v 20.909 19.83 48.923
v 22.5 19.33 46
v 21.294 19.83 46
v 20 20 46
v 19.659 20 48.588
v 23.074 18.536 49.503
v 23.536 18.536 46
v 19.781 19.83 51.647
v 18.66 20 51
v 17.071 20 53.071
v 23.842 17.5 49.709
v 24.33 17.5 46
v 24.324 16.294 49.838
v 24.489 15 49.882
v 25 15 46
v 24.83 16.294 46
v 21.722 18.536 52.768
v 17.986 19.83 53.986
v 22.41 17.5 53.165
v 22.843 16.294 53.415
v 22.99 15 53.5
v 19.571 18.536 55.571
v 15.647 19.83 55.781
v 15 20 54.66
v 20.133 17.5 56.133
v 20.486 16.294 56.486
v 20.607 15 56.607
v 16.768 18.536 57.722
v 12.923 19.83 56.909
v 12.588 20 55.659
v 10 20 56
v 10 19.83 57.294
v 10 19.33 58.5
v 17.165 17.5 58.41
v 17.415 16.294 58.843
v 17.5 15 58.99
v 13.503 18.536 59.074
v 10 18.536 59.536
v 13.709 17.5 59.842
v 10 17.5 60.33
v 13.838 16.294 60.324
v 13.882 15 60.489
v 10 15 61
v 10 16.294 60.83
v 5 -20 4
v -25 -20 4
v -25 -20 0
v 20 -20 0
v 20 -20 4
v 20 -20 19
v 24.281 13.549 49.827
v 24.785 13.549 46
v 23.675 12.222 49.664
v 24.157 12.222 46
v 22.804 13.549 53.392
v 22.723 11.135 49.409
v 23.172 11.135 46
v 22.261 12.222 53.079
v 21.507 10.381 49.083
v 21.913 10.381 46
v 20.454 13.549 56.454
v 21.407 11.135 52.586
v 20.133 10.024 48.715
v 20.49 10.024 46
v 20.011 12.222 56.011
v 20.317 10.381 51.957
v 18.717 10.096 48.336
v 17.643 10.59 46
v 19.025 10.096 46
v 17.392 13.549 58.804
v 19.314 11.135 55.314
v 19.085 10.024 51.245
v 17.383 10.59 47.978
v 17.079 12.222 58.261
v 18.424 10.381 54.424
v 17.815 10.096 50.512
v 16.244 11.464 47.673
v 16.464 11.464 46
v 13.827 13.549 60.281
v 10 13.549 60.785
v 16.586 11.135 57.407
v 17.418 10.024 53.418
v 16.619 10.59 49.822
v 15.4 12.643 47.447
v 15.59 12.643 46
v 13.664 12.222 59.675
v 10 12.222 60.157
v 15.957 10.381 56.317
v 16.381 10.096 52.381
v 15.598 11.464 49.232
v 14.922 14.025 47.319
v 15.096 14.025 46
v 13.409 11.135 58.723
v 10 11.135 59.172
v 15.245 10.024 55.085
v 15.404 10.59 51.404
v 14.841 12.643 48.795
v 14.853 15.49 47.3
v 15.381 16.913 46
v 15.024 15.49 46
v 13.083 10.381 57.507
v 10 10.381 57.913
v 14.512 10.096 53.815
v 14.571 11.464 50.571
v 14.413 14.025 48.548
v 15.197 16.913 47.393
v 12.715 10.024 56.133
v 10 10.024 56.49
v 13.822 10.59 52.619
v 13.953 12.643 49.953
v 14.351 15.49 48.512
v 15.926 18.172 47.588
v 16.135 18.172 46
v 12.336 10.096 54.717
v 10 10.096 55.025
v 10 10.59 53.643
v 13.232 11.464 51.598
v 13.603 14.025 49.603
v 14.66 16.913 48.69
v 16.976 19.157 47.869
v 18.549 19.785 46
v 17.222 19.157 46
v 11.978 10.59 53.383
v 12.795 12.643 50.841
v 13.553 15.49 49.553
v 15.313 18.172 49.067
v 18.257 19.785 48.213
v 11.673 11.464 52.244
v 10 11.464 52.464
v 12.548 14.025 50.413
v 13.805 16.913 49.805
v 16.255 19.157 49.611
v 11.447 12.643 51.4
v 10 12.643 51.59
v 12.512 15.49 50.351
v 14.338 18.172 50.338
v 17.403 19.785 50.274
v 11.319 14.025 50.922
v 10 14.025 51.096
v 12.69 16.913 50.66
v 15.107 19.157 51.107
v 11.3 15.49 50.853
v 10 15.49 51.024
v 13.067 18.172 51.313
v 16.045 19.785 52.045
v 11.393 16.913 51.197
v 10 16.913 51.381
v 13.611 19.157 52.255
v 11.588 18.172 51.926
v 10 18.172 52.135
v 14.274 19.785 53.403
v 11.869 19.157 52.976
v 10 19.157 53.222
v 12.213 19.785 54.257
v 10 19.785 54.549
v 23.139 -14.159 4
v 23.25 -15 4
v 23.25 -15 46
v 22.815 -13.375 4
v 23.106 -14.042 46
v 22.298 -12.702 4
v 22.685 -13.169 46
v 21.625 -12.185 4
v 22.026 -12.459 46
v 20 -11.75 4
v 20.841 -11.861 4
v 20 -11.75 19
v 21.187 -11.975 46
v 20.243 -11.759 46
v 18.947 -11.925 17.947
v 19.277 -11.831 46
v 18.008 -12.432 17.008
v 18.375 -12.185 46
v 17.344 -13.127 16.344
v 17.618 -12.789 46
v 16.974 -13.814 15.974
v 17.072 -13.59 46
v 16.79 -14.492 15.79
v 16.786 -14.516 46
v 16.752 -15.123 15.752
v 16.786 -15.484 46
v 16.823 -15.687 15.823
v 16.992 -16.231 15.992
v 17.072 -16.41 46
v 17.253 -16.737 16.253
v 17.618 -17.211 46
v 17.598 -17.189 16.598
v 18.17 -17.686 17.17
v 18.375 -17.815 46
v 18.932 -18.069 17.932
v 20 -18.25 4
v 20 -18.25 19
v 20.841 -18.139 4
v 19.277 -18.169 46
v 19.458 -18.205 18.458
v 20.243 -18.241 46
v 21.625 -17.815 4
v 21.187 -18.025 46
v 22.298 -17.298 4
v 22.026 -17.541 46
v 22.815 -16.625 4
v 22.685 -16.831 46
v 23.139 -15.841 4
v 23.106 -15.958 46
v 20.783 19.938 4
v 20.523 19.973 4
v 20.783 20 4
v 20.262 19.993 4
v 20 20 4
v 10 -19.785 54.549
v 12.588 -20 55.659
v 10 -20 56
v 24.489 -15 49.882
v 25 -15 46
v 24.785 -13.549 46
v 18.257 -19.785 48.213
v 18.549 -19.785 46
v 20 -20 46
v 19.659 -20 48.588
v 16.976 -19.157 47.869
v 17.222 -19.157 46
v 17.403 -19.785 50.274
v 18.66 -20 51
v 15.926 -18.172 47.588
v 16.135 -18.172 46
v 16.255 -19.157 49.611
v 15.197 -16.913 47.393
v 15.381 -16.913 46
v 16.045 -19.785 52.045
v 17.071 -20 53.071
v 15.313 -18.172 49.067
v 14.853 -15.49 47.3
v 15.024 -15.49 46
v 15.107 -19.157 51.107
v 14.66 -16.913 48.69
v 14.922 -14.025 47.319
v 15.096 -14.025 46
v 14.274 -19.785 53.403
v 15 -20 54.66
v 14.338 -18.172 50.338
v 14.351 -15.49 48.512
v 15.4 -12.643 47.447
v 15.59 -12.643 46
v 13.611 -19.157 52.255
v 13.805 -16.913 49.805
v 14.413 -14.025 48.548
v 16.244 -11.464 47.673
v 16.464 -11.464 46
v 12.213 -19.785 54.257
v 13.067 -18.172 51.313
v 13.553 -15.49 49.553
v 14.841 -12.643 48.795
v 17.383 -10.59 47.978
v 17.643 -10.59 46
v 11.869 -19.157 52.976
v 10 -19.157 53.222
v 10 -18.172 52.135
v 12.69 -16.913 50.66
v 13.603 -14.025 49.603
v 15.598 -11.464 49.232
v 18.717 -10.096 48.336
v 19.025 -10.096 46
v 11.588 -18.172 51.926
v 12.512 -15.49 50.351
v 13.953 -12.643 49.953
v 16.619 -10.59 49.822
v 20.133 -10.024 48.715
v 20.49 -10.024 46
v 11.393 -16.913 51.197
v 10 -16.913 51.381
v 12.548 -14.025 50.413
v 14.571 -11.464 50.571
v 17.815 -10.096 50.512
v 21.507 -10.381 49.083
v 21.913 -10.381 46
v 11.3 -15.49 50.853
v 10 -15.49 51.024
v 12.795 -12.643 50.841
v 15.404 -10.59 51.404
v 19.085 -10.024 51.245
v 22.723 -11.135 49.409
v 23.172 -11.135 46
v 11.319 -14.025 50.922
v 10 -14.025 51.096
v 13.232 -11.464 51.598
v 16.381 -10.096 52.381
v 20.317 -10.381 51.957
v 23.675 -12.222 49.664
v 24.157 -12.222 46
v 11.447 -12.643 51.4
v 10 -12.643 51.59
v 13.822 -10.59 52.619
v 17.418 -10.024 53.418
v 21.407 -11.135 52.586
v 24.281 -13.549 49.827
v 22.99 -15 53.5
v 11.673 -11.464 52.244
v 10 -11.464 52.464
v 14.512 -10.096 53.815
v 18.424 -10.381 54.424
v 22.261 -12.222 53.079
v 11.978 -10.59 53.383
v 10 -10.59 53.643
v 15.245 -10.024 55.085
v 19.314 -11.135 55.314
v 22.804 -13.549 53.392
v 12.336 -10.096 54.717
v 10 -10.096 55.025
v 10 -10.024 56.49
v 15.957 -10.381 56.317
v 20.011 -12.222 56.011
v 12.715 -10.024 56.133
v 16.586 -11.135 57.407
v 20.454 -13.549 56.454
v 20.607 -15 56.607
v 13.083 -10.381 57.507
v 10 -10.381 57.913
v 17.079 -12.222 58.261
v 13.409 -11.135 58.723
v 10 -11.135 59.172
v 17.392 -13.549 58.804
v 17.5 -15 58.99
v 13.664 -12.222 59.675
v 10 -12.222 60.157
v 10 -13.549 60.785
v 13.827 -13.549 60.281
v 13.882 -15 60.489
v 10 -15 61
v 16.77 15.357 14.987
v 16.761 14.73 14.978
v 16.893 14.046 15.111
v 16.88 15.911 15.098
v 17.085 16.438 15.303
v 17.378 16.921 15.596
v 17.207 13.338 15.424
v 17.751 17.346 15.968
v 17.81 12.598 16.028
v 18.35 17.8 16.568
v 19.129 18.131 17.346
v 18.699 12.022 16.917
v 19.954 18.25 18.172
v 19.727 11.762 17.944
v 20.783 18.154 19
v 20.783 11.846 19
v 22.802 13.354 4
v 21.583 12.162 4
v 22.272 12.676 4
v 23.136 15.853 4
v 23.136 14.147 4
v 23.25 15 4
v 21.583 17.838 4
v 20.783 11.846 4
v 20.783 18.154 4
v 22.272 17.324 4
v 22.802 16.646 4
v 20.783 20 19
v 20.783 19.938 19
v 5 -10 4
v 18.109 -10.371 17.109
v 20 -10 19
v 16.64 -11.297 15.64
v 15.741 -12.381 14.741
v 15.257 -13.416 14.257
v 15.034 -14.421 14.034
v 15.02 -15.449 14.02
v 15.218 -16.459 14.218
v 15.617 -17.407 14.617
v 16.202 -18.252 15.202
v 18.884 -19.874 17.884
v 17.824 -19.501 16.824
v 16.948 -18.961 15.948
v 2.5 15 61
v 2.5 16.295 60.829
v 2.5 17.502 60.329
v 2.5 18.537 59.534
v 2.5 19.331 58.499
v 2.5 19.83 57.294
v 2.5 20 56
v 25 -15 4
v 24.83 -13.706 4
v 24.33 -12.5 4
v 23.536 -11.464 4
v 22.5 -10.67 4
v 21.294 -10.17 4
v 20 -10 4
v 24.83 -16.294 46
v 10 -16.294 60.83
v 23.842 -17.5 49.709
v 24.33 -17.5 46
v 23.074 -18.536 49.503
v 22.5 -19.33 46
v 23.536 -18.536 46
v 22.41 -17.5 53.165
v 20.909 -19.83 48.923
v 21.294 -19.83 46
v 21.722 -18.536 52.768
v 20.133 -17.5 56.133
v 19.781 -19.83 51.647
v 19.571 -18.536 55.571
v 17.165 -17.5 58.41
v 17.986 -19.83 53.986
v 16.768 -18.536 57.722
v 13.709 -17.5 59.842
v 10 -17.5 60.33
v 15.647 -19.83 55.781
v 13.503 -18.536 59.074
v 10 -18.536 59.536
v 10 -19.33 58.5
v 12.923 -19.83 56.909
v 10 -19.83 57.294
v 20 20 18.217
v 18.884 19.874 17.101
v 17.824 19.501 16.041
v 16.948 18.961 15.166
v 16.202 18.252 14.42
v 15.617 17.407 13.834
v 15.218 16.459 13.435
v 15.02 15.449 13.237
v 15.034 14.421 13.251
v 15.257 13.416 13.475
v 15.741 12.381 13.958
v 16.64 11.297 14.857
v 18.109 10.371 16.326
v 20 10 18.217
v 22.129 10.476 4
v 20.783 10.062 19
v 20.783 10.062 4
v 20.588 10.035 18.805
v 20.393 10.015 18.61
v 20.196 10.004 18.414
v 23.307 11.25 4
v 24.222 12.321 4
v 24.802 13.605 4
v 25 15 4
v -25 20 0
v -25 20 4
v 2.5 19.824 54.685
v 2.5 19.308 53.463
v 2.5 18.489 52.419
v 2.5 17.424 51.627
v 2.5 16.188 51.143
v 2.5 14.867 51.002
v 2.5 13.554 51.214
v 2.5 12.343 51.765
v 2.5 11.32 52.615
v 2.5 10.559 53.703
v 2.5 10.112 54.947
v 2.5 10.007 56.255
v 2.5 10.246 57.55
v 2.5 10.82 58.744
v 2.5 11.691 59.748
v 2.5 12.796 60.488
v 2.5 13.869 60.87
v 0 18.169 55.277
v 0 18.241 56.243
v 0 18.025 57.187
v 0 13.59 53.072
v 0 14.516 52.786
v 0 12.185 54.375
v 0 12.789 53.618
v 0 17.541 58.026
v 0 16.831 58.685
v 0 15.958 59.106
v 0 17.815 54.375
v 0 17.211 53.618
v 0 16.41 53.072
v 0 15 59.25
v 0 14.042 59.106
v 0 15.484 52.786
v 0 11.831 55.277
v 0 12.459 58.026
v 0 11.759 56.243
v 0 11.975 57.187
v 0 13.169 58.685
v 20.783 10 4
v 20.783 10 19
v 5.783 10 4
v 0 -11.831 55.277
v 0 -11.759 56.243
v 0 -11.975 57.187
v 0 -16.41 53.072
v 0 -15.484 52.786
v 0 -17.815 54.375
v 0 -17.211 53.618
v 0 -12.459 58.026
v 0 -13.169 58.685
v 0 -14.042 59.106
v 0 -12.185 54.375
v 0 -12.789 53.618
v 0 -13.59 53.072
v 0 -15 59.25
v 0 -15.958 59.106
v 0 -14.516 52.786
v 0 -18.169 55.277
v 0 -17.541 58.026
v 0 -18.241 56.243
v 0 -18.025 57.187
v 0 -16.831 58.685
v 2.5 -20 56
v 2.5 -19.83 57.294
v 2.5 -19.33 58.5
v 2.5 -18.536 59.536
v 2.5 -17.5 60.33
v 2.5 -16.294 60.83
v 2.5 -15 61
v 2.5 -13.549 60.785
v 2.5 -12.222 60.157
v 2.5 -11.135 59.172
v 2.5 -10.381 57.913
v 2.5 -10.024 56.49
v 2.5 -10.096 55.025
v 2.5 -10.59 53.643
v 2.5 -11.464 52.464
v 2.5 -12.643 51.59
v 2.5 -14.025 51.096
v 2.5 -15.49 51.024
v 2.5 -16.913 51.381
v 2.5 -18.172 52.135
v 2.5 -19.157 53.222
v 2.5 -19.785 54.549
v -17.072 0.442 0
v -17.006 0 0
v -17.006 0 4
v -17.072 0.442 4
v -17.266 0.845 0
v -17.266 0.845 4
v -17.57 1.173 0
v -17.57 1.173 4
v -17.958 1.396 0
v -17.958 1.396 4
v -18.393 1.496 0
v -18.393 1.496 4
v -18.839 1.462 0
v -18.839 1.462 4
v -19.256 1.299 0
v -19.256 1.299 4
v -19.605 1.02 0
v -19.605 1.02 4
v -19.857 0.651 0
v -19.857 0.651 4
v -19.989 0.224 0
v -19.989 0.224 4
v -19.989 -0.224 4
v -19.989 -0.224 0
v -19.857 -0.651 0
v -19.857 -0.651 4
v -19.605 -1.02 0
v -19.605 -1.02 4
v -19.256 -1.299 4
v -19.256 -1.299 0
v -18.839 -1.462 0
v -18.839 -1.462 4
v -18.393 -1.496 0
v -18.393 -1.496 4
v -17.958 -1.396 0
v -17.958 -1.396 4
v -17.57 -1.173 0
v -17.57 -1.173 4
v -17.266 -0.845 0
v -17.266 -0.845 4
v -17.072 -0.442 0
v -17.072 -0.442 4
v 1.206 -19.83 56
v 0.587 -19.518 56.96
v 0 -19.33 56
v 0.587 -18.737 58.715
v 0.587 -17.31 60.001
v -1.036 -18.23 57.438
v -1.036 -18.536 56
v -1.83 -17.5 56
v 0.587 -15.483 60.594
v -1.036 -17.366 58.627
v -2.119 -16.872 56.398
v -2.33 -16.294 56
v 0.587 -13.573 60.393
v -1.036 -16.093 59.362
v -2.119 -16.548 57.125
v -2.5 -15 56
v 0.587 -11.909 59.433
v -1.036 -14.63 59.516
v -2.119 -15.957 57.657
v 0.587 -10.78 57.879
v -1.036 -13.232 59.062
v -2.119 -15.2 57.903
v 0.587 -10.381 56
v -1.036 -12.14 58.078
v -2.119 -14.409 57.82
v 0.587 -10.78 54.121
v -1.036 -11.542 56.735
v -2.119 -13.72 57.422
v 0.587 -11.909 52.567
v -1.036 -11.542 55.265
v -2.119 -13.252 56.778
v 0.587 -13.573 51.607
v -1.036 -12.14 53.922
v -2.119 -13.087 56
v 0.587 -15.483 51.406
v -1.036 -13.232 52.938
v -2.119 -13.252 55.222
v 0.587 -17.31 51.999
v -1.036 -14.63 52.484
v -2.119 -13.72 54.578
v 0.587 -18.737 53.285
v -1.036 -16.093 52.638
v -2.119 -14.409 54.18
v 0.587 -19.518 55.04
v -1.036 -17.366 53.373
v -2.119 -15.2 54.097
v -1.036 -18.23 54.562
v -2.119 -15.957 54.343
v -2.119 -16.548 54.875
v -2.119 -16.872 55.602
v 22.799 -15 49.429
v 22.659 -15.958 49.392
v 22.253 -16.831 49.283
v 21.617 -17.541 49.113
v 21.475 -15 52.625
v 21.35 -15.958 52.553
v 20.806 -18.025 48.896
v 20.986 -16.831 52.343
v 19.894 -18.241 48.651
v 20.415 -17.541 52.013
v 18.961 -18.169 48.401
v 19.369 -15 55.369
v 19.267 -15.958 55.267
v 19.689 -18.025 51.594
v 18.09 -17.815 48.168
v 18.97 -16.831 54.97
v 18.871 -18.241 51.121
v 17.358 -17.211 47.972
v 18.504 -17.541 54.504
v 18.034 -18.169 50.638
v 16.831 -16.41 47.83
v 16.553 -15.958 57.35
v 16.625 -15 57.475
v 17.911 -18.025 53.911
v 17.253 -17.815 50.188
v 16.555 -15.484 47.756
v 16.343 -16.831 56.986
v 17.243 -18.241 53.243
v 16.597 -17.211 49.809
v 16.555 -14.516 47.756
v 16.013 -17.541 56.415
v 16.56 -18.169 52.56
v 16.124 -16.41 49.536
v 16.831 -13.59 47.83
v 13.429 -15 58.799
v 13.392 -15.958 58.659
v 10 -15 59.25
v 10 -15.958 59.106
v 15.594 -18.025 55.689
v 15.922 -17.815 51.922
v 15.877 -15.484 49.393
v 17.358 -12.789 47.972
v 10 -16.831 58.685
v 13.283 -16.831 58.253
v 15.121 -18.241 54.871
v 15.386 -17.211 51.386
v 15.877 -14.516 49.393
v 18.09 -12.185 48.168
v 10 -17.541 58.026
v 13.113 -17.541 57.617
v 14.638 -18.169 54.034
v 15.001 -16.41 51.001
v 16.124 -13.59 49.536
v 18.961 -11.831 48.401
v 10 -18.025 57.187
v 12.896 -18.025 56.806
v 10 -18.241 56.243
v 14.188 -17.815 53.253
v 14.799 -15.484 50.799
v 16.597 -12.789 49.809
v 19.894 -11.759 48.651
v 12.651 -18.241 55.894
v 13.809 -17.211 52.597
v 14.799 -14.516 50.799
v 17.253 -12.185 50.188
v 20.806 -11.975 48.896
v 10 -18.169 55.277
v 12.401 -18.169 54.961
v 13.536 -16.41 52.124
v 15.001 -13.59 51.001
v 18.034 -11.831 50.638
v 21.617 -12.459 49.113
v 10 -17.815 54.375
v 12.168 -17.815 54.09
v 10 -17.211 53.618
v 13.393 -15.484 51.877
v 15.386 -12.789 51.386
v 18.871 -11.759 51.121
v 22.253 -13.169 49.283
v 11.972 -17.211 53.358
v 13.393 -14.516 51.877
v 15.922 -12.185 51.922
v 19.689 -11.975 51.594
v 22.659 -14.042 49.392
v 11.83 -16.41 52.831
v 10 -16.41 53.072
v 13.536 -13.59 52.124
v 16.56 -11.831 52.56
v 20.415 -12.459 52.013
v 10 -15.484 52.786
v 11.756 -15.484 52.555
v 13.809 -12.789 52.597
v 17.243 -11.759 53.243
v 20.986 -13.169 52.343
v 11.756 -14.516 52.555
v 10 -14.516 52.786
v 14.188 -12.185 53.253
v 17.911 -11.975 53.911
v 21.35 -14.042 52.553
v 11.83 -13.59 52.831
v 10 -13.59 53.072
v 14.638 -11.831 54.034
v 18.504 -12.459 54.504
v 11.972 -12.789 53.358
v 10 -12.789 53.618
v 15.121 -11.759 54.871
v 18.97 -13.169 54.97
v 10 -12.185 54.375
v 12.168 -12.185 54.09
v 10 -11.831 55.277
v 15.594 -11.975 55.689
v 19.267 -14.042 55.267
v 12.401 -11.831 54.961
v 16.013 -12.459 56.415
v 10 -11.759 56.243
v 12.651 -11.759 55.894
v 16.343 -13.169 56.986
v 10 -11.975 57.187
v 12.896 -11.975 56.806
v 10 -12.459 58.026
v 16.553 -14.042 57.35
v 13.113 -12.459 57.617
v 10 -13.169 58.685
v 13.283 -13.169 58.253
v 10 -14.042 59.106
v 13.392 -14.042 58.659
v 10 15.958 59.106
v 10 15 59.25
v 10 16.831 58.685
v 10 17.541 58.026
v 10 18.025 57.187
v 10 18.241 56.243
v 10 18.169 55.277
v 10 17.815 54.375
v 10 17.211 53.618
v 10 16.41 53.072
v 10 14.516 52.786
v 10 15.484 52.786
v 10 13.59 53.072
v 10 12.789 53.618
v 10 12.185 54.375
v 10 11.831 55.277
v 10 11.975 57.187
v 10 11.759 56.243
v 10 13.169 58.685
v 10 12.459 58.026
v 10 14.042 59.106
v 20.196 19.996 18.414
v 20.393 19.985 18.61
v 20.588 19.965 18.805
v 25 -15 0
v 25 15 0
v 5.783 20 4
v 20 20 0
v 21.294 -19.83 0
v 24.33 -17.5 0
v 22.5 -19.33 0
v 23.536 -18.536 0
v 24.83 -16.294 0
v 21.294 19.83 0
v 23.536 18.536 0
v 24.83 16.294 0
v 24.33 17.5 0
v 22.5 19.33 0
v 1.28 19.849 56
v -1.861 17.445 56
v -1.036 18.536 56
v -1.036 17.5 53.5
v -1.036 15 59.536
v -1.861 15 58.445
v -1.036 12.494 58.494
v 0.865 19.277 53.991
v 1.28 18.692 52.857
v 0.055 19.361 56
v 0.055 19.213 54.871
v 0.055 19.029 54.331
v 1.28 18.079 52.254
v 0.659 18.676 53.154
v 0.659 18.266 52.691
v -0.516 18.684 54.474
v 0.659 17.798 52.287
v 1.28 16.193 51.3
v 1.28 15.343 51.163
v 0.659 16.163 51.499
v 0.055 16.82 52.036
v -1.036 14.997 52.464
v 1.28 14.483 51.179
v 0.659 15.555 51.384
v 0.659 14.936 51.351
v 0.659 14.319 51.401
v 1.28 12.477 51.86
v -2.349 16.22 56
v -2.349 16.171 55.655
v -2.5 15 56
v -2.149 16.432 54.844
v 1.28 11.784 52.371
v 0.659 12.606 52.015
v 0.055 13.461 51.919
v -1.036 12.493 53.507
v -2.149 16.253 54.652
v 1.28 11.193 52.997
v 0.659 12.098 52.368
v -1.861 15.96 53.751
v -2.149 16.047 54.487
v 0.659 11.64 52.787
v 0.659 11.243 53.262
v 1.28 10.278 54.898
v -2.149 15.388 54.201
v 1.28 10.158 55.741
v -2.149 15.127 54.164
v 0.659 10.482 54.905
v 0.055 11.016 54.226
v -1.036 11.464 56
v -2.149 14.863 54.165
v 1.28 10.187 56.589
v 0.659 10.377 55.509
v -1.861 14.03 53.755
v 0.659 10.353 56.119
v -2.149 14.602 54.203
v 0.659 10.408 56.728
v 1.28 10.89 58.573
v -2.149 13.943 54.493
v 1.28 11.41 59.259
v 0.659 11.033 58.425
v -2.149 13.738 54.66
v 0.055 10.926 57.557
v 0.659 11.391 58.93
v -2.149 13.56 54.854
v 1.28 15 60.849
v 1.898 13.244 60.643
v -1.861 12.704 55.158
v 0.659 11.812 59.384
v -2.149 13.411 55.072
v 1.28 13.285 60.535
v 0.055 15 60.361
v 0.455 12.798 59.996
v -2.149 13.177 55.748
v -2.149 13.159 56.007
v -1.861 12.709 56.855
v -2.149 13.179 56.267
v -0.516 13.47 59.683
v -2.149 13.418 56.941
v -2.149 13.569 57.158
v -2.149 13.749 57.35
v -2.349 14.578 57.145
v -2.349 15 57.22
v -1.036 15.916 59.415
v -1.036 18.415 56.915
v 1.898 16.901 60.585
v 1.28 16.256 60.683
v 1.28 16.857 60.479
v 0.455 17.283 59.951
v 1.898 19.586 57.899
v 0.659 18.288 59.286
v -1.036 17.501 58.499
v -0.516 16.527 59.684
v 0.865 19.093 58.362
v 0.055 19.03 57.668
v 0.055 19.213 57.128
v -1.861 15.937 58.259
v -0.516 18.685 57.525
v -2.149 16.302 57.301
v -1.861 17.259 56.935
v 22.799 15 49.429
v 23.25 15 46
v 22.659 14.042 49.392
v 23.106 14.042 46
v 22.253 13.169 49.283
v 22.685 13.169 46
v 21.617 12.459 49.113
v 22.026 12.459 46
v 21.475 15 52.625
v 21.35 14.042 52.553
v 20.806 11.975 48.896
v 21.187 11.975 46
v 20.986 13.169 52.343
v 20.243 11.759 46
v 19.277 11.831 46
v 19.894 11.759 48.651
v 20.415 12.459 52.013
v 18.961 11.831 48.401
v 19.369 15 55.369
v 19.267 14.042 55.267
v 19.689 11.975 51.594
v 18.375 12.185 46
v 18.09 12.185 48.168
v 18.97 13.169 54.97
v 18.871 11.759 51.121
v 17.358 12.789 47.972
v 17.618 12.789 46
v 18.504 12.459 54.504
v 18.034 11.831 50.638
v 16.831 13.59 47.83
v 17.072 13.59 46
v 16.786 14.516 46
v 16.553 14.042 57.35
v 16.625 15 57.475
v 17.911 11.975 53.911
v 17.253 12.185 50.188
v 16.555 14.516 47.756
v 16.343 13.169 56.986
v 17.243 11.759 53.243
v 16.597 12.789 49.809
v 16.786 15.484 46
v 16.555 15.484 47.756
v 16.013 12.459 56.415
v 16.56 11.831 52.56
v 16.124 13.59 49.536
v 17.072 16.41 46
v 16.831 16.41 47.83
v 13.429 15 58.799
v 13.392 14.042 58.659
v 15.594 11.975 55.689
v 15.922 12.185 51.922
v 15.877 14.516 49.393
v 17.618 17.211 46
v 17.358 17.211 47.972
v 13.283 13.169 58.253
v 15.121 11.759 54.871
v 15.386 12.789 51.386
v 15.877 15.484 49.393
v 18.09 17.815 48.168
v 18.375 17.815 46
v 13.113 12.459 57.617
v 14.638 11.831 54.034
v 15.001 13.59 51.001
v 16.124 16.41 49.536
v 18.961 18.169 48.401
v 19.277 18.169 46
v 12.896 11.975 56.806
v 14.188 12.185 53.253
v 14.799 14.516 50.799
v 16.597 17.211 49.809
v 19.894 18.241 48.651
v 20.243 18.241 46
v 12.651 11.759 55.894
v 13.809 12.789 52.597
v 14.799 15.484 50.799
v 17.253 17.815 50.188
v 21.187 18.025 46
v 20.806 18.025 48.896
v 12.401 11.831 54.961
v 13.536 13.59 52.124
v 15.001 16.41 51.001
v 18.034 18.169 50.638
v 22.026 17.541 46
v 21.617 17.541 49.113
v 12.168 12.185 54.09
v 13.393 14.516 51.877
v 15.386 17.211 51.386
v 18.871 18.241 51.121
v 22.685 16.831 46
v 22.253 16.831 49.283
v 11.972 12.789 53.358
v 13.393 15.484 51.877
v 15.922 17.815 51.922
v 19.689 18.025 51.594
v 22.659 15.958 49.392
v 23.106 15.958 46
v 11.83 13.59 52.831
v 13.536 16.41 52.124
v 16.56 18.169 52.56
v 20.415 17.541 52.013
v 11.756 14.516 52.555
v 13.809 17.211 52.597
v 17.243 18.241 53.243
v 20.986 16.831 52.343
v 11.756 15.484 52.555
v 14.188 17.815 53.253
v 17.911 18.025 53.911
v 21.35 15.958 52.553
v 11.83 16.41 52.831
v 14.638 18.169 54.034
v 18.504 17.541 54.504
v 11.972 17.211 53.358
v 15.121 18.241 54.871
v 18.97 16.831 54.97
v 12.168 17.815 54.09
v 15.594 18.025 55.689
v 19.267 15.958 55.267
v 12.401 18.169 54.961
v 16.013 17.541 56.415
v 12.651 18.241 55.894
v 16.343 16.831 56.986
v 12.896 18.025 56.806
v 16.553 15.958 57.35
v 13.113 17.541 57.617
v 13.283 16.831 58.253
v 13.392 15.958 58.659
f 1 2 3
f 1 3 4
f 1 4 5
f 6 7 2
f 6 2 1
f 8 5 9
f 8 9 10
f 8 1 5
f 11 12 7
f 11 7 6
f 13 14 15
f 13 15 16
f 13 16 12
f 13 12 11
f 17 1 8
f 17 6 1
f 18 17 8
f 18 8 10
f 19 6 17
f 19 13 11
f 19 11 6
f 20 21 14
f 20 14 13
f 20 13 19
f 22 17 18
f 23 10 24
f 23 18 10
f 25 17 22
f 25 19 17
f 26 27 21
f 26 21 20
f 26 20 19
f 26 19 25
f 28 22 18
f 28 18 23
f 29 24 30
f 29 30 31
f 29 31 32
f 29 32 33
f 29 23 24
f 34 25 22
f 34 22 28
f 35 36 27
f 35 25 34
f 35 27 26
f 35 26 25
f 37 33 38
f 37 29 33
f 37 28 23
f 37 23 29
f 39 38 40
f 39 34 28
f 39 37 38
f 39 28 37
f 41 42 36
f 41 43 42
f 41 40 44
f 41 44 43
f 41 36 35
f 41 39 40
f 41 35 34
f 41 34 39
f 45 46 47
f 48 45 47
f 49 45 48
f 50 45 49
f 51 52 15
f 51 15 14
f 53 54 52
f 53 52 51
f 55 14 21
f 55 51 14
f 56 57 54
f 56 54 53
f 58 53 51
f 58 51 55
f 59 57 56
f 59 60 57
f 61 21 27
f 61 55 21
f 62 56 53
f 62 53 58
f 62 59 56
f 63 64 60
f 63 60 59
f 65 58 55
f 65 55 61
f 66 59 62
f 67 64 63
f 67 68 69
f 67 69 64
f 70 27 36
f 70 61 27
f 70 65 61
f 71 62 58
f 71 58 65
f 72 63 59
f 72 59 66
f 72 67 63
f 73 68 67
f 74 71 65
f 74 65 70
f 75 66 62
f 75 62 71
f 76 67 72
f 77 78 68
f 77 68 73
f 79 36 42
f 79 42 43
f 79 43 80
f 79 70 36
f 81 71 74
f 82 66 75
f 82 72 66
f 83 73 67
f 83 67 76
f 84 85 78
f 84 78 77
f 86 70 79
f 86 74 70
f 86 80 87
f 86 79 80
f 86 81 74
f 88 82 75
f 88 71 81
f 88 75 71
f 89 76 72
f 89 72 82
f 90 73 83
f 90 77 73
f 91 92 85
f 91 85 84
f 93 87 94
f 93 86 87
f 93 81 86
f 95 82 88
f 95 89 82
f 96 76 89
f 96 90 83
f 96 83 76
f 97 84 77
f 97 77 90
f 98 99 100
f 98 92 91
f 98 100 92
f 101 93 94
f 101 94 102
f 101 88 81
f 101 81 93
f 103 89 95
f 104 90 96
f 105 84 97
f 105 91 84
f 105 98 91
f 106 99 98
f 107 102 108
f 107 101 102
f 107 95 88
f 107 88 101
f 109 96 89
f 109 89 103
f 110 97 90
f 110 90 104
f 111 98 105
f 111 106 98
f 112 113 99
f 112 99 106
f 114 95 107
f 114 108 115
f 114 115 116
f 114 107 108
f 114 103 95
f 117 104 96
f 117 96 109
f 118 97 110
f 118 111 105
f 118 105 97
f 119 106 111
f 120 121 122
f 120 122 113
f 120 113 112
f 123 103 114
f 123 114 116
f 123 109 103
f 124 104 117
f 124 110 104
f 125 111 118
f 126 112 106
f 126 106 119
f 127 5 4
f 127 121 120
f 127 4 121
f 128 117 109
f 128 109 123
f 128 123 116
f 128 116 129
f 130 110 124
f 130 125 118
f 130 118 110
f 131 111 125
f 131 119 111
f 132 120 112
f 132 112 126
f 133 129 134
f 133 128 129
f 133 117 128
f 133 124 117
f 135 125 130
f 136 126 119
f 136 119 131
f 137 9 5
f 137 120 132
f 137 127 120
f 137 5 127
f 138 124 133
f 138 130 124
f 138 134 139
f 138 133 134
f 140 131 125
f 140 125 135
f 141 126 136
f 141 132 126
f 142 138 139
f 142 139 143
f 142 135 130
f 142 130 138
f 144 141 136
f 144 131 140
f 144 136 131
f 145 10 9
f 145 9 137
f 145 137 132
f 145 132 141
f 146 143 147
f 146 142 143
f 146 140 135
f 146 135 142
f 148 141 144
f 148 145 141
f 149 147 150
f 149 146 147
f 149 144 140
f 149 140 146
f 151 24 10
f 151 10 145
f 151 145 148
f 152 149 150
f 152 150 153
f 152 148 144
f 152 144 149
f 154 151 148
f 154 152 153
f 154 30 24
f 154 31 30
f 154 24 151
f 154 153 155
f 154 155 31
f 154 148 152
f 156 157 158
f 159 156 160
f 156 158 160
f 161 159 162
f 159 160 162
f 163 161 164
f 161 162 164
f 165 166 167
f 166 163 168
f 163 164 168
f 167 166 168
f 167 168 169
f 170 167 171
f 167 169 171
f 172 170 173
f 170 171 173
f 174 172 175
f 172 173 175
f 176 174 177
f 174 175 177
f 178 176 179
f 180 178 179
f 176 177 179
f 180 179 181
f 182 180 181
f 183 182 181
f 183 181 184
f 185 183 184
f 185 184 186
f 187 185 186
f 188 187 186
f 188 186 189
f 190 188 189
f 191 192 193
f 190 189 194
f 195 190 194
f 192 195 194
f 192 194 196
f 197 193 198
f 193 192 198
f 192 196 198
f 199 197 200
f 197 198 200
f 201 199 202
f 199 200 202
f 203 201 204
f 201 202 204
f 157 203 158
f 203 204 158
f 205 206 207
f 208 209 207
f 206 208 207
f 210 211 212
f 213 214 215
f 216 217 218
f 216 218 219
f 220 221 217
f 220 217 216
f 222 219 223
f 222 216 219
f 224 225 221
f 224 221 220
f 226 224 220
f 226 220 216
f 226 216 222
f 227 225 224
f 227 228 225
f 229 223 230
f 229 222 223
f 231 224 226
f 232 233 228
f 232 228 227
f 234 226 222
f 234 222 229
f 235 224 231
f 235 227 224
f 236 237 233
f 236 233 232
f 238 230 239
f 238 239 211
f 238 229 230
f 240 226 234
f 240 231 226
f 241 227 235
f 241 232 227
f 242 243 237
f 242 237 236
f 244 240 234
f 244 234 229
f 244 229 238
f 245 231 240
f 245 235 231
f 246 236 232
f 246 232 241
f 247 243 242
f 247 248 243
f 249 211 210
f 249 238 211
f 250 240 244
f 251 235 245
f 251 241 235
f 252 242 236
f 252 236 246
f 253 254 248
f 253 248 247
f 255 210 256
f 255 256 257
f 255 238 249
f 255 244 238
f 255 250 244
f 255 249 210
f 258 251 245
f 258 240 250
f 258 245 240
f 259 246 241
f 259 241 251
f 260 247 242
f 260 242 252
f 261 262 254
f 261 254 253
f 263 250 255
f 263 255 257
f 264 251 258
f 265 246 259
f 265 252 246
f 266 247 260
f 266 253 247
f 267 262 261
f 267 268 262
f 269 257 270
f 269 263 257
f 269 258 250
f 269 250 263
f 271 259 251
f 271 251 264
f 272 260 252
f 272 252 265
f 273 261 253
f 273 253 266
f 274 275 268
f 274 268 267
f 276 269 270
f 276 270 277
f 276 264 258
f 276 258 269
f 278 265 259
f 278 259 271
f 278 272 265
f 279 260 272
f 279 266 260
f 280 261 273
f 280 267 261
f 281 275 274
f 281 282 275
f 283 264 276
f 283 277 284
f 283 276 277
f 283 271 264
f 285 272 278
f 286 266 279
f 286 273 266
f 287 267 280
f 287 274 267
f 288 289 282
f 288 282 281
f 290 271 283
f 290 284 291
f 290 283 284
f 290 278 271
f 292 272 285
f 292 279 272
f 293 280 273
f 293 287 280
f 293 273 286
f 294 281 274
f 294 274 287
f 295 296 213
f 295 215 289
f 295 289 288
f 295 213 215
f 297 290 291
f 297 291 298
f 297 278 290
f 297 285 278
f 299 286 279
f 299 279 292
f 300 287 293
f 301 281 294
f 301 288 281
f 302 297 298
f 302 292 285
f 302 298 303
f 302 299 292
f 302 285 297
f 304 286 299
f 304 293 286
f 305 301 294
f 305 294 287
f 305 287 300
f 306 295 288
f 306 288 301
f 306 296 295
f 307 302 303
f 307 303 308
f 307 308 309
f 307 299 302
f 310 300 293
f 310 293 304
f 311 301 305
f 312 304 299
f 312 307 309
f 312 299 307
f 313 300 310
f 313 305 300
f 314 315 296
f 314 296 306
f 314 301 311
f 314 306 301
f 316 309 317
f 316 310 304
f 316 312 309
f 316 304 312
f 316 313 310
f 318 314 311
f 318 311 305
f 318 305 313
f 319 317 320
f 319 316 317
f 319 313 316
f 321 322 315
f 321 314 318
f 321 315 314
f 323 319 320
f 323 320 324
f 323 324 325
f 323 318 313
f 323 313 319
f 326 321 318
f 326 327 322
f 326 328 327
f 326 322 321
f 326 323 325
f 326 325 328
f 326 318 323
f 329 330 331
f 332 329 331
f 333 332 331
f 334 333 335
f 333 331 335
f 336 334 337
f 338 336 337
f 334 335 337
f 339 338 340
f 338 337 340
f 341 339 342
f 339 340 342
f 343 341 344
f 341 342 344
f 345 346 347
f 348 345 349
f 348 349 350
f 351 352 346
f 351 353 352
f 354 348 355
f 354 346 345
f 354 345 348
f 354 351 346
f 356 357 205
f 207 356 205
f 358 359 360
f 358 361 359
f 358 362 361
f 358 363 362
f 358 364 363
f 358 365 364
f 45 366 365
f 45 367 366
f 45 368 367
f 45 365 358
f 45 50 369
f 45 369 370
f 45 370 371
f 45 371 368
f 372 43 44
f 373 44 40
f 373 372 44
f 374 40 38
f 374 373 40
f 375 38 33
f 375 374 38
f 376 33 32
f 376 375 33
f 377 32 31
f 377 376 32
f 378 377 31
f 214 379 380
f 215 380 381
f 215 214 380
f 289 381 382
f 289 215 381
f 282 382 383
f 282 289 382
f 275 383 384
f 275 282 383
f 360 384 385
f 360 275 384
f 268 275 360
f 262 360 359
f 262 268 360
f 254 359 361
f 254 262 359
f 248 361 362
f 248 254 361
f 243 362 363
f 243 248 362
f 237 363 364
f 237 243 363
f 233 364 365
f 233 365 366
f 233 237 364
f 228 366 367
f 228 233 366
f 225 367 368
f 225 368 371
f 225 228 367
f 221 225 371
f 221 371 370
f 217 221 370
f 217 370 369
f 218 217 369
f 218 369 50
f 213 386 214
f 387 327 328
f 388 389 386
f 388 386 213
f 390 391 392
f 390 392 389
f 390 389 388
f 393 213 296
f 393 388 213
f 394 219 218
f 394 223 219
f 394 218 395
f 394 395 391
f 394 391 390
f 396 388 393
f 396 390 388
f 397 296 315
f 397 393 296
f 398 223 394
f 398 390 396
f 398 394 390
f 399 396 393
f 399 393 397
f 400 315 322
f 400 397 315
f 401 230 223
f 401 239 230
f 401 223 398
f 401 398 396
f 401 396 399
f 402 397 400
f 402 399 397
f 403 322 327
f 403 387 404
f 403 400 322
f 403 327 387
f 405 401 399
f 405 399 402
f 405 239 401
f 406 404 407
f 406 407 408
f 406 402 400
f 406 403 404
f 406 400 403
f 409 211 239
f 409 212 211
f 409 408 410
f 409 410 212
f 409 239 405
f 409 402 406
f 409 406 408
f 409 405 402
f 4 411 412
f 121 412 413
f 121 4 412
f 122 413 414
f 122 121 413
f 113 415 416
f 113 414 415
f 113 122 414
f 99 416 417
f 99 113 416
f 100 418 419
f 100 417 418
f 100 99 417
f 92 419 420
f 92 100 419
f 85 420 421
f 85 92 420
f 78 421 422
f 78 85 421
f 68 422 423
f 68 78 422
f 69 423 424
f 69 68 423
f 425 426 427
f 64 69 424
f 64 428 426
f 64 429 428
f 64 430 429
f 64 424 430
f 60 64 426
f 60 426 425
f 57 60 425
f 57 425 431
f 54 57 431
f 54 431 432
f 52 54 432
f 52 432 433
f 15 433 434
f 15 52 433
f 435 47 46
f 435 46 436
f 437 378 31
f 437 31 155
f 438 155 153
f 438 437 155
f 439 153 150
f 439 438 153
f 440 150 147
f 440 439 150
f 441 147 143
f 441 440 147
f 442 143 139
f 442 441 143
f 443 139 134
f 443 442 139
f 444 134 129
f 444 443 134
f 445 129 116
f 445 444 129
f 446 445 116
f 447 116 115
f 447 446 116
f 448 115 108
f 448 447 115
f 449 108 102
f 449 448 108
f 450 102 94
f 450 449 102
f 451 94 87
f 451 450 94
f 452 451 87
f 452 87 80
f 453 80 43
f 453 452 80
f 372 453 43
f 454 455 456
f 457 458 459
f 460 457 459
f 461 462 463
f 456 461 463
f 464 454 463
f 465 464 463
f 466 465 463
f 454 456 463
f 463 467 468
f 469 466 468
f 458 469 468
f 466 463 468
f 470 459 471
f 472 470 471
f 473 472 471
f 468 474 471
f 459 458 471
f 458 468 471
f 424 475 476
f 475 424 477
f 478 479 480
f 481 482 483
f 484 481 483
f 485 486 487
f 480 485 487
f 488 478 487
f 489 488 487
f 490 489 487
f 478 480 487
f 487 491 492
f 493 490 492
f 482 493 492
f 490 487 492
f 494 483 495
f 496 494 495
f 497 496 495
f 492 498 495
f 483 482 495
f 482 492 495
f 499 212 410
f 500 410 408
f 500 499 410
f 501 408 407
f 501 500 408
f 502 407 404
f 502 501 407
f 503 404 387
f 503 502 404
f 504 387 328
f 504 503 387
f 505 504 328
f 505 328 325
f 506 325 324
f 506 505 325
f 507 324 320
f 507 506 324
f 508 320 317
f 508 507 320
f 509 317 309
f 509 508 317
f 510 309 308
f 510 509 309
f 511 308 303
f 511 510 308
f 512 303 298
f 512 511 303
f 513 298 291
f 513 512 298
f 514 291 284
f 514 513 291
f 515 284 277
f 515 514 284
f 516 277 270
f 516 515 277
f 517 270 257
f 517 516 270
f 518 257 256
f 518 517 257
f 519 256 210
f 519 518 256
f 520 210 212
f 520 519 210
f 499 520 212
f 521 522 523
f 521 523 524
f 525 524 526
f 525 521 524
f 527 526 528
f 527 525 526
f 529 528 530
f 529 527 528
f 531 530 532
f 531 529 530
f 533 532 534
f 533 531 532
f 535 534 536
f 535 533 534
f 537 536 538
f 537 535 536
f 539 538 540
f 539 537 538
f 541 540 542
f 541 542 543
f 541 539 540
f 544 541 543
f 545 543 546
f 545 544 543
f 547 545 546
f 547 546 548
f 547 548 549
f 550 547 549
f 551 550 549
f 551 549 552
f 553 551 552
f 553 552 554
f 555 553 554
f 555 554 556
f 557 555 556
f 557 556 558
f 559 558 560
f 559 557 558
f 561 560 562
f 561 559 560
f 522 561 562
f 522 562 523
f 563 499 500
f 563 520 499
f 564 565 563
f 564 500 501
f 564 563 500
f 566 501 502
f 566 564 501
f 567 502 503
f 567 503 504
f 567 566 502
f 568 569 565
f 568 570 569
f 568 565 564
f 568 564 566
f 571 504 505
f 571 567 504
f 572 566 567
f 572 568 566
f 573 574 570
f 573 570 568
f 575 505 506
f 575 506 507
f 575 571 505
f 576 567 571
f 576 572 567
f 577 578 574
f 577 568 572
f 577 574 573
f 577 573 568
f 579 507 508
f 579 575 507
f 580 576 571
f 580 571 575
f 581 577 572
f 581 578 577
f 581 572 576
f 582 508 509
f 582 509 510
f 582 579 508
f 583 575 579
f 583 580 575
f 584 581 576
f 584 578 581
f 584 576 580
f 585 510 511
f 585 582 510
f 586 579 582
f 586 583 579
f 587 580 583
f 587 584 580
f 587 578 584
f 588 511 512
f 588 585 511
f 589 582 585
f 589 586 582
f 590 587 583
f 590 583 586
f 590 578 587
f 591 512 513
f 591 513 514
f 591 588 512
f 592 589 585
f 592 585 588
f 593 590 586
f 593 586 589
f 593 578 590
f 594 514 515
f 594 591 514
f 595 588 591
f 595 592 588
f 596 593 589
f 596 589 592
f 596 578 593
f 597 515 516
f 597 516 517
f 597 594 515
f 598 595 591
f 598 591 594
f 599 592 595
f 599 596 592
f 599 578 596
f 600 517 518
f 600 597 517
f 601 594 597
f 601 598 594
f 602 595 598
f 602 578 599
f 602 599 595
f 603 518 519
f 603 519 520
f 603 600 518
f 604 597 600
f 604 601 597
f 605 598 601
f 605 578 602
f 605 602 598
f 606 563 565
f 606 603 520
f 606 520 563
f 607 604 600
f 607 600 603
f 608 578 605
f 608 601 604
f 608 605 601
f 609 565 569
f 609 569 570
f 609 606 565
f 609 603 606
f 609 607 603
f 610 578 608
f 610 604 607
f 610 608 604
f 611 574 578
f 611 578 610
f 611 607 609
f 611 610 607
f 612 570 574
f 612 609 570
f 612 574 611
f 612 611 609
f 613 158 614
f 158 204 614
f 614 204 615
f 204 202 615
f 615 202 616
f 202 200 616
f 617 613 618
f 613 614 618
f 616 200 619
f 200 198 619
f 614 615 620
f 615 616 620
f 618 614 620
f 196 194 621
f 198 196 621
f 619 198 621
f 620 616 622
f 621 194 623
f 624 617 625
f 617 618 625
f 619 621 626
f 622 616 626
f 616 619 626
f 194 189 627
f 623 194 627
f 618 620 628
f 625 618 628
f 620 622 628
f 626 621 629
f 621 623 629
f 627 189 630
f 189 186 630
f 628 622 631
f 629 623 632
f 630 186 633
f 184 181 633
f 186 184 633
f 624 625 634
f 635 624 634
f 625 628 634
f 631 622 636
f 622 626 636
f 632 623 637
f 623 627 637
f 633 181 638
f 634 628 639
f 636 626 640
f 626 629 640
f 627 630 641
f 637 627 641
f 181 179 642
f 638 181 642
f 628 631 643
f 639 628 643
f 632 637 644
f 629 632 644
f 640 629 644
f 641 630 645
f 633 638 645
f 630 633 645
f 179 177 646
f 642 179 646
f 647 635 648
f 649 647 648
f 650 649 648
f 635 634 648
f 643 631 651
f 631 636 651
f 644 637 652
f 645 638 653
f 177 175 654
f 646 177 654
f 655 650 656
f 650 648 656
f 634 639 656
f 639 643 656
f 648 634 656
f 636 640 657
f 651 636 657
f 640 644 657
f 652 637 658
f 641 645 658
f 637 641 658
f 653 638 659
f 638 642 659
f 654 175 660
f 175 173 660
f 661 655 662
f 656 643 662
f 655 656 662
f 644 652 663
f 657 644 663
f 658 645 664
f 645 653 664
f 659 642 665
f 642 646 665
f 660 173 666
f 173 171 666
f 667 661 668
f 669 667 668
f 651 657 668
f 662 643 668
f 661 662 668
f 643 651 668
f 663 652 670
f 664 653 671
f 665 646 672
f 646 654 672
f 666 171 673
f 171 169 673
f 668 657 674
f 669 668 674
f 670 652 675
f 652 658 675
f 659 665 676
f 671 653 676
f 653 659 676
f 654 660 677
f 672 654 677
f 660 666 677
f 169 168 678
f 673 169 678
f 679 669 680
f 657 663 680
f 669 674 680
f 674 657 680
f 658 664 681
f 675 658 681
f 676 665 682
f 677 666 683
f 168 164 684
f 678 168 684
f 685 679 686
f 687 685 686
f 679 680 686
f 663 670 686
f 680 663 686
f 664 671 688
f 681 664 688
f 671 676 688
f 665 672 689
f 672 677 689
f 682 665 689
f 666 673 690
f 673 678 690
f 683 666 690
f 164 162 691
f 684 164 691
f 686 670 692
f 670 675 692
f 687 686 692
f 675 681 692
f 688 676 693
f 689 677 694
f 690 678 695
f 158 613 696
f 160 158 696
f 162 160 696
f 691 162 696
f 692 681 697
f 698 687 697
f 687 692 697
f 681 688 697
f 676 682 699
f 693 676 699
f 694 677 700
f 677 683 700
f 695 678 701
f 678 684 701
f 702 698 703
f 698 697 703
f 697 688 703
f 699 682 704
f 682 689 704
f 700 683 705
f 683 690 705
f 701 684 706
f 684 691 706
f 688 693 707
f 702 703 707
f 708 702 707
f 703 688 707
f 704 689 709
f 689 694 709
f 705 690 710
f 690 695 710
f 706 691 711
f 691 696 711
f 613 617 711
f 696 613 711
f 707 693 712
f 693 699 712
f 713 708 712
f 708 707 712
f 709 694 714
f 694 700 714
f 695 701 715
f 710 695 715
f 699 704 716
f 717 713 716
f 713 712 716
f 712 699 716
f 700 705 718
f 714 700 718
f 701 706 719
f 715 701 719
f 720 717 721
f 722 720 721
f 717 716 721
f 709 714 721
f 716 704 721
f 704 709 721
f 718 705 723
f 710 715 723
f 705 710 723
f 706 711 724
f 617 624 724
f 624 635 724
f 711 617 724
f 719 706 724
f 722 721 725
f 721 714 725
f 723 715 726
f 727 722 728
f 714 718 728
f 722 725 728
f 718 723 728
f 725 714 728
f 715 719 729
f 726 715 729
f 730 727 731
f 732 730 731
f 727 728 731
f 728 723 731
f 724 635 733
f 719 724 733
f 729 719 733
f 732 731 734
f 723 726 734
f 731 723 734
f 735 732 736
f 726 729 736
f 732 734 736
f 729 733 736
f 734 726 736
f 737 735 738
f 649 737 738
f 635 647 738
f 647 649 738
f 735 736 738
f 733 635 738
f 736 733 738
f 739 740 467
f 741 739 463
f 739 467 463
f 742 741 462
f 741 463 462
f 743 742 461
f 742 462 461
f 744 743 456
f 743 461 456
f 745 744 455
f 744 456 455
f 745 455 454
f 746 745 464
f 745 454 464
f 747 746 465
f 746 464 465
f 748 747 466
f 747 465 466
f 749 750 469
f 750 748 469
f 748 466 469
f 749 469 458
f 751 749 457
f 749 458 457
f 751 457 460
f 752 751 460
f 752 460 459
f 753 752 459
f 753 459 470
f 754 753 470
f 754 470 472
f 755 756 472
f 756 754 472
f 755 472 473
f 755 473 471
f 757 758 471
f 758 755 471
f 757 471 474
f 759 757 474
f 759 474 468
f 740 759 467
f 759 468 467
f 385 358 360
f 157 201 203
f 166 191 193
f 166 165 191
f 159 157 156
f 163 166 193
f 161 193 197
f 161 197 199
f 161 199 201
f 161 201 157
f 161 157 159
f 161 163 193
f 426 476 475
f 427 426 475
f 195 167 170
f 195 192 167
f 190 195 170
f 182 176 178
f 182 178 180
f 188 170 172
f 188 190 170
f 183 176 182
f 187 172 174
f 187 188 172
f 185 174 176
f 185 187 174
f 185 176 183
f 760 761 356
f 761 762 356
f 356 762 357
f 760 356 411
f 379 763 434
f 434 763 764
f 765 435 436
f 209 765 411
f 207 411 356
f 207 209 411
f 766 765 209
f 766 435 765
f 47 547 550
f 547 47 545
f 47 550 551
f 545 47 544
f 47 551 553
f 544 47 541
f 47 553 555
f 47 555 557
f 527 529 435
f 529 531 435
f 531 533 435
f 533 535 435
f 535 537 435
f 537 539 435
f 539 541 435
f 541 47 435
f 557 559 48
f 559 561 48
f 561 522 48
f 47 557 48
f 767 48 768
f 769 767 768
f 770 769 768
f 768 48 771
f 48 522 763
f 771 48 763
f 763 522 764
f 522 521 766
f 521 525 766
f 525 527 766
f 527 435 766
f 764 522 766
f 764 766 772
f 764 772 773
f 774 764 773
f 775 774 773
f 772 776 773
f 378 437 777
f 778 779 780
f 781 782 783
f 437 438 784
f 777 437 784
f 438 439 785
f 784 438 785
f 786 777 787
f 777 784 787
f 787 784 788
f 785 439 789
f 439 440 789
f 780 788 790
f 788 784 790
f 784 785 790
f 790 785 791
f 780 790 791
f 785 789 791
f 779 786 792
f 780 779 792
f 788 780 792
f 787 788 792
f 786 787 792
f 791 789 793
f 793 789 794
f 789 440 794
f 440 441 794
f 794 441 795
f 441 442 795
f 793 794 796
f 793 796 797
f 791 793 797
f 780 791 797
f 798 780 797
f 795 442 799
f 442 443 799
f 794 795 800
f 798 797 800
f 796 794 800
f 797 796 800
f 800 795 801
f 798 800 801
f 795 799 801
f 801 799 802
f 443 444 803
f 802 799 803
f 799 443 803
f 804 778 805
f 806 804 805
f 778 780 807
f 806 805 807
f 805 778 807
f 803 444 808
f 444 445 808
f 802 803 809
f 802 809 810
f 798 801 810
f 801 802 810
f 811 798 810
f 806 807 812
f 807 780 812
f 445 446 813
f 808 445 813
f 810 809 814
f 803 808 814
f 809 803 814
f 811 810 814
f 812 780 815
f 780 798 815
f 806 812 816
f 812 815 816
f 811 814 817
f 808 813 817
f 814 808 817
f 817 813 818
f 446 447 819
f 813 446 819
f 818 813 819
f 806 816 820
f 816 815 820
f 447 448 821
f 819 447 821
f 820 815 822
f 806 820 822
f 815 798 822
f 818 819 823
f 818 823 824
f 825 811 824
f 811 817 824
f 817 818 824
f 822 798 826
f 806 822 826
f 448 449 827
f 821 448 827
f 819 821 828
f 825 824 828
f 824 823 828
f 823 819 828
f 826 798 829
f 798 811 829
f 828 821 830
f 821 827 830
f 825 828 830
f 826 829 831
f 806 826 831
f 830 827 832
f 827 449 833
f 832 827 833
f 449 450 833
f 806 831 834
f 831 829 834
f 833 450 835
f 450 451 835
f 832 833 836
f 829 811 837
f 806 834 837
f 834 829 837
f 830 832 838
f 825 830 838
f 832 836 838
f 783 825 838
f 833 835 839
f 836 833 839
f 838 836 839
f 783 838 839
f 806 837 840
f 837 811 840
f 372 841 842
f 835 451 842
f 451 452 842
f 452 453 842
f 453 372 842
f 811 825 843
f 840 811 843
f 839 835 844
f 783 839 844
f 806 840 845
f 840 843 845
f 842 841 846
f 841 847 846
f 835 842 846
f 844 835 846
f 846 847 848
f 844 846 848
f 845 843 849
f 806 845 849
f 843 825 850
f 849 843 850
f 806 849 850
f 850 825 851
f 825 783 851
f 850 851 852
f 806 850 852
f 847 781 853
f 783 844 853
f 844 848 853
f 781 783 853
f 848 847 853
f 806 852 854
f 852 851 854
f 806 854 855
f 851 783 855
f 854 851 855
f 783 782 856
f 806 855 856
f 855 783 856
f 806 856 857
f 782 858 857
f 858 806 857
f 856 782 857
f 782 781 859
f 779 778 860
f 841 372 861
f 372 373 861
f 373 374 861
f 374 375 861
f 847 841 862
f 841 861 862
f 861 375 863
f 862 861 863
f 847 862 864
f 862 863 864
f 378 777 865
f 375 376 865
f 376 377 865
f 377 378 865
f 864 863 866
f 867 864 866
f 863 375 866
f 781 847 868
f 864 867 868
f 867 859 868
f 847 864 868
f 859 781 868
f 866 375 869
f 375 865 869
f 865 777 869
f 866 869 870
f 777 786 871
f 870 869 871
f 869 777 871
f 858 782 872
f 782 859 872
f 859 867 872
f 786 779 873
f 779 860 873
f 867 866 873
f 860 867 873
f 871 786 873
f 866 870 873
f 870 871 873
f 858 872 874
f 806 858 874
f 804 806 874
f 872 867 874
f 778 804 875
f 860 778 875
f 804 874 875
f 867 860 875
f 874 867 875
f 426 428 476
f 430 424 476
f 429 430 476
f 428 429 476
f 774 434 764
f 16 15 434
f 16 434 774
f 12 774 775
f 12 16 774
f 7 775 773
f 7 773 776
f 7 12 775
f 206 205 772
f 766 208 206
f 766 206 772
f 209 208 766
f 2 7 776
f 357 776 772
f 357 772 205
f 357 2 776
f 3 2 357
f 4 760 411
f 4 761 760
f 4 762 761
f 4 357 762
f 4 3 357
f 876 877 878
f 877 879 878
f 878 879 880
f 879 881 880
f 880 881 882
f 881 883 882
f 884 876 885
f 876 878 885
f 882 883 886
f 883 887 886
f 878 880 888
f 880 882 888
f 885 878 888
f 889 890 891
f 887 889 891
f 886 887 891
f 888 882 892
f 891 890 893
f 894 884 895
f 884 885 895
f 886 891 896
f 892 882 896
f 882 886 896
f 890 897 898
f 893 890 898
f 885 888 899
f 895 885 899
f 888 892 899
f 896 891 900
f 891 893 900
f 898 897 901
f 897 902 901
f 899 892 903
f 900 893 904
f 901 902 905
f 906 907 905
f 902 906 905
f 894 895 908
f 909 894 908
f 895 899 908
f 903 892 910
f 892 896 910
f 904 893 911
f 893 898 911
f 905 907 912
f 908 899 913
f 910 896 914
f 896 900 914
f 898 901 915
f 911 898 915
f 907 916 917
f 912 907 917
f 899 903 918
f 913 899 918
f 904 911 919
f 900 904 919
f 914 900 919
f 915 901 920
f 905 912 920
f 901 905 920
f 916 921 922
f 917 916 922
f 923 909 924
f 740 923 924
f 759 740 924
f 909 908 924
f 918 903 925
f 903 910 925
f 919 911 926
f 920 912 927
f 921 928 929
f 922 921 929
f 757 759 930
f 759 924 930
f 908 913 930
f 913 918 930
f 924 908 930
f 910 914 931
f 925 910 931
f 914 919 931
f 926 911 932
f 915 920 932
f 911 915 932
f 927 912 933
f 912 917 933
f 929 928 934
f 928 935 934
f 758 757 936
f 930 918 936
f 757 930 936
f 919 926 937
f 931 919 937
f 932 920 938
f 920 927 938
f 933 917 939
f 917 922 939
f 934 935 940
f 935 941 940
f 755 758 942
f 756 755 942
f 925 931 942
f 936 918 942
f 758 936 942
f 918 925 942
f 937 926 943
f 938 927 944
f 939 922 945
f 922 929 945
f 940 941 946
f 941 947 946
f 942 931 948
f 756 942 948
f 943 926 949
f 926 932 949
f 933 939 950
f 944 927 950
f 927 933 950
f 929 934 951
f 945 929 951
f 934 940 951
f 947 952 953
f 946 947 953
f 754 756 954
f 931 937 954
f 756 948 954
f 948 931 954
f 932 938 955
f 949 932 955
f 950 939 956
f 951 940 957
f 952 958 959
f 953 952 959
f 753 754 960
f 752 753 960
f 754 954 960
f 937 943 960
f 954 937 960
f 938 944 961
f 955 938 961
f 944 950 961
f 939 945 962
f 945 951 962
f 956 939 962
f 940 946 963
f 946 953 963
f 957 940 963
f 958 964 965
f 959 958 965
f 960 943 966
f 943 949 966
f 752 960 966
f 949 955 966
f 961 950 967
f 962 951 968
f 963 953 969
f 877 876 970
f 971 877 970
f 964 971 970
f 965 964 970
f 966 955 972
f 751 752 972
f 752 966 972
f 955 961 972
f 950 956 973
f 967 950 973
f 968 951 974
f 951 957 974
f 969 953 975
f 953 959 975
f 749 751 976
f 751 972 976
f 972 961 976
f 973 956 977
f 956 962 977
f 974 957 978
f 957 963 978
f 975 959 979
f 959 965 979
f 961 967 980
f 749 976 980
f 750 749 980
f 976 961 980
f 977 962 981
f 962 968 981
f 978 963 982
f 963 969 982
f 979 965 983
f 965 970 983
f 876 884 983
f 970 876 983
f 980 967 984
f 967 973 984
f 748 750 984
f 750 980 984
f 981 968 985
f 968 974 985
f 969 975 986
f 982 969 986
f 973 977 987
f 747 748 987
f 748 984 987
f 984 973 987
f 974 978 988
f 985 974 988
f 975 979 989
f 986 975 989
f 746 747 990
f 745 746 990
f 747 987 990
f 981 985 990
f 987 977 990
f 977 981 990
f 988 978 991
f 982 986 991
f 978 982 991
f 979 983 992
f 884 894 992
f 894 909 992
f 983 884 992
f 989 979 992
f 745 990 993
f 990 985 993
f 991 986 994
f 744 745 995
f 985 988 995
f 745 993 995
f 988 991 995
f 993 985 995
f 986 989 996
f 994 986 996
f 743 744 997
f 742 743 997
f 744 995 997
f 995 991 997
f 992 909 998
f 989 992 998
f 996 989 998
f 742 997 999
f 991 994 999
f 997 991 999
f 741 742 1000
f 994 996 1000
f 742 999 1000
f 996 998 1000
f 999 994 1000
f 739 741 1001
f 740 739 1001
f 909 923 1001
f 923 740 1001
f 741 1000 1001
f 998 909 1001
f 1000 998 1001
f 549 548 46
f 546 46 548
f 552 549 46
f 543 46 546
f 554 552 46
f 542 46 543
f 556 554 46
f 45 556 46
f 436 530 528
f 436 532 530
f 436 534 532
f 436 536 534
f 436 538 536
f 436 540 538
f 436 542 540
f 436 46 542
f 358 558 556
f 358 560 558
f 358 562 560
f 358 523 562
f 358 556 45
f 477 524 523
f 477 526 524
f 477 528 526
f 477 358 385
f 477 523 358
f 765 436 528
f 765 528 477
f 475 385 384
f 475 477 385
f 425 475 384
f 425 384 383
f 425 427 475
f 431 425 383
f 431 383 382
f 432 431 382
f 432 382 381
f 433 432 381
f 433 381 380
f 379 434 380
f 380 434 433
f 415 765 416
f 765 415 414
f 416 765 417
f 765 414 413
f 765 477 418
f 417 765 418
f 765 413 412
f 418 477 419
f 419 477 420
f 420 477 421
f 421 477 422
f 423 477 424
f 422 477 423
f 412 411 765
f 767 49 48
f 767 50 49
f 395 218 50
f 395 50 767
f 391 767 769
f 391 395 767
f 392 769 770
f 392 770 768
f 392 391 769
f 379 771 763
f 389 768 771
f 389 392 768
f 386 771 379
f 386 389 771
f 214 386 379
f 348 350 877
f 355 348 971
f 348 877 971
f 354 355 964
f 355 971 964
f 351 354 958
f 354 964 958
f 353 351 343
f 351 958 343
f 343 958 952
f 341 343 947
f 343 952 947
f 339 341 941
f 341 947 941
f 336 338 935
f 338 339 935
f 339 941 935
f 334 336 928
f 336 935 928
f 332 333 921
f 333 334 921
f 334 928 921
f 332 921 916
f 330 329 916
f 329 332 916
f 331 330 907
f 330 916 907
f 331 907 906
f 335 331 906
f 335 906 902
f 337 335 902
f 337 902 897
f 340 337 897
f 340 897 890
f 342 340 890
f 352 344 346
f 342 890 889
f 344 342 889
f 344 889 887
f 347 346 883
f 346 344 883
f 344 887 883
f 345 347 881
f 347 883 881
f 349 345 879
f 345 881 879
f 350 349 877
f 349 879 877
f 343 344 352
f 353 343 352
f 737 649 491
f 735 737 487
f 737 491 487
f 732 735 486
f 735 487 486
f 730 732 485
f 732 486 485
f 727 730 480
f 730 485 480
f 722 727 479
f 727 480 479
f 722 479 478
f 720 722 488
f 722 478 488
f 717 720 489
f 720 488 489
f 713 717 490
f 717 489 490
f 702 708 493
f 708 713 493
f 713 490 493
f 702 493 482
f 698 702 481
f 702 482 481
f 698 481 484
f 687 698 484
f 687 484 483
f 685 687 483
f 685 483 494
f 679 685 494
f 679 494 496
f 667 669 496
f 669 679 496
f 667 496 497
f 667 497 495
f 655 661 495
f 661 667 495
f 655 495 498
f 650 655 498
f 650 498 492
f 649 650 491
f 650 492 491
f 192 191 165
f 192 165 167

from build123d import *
from build123d import SkipClean  # not in build123d's __all__

# Parameters (mm, degrees)
F0_W      = 50
F0_H      = 40
F0_R      = 1.5
F1_DEPTH  = 4
F2_R      = 3.25
F9_R      = 5
F10_DEPTH = 2.5
F12_R     = 5
F13_DEPTH = 2.5
F14_R     = 4.9999
F17_DEPTH = 10
F18_DEPTH = 25
F20_DEPTH = 10


# Not quite as in the source:
# - a fillet or chamfer that OpenCascade refuses, or shapes differently, is made with other operations: its cross-section is extruded or revolved along the edge and cut away or added
# - a fillet or chamfer is up to 0.001 mm smaller than in the source, because OpenCascade refuses the exact size


with BuildPart() as f1:
    # F0 (on Top) → F1 (new body)
    with BuildSketch(Plane.XY):
        Rectangle(F0_W, F0_H)
        with Locations((-18.505550921, 0)):
            Circle(F0_R, mode=Mode.SUBTRACT)
    extrude(amount=F1_DEPTH)

    # F5: sweep along a path in F4
    with BuildLine(Plane.XZ.offset(-15)) as f5_path:
        Line((20, 4), (20, 46))
        ThreePointArc((20, 46), (17.0710678119, 53.0710678119), (10, 56))
        Line((10, 56), (0, 56))
    # F2 (on face) → F5 (sweep)
    with BuildSketch(Plane.XY.offset(4)):
        with BuildLine():
            ThreePointArc((20, 20), (16.4644660941, 11.4644660941), (25, 15))
            ThreePointArc((25, 15), (23.5355339059, 18.5355339059), (20, 20))
        make_face()
        with Locations((20, 15)):
            Circle(F2_R, mode=Mode.SUBTRACT)
    sweep(path=f5_path.line)

    # F8: sweep along a path in F7
    with BuildLine(Plane.XZ.offset(15)) as f8_path:
        Line((20, 4), (20, 46))
        ThreePointArc((20, 46), (17.0710678119, 53.0710678119), (10, 56))
        Line((10, 56), (0, 56))
    # F2 (on face) → F8 (sweep)
    with BuildSketch(Plane.XY.offset(4)):
        with BuildLine():
            ThreePointArc((19.9999999389, -20), (23.5355338843, -18.5355339275), (25, -15))
            ThreePointArc((25, -15), (16.4644661157, -11.4644660725), (19.9999999389, -20))
        make_face()
        with Locations((20, -15)):
            Circle(F2_R, mode=Mode.SUBTRACT)
    sweep(path=f8_path.line)

    # F9 (on face) → F10 (join)
    with BuildSketch(Plane(origin=(0, 0, 0), x_dir=(0, -1, 0), z_dir=(-1, 0, 0))):
        with Locations((15, 56)):
            Circle(F9_R)
    extrude(amount=F10_DEPTH)

    # F11: fillet of radius 5 on 1 edges, made by hand

    # F11_s1 → F11_t2 (revolve, cut)
    with BuildSketch(Plane.XY.offset(56)):
        with BuildLine():
            ThreePointArc((2.5, -20), (-1.0355339059, -18.5355339059), (-2.5, -15))
            Line((-2.5, -15), (-2.5, -20))
            Line((-2.5, -20), (2.5, -20))
        make_face()
    revolve(axis=Axis((-2.5, -15, 56), (-1, 0, 0)), mode=Mode.SUBTRACT)

    # F12 (on face) → F13 (join)
    with BuildSketch(Plane(origin=(0, 0, 0), x_dir=(0, -1, 0), z_dir=(-1, 0, 0))):
        with Locations((-15, 56)):
            Circle(F12_R)
    extrude(amount=F13_DEPTH)

    # F14 (radius 5 in the source; OpenCascade refuses exactly that, so slightly less here)
    f14_edges = [f1.edges().sort_by_distance(p)[0] for p in [
        (-2.5, 20, 56),
        (25, 20, 2),
        (25, -20, 2),
    ]]
    fillet(f14_edges, radius=F14_R)

    # F16 (on offset) → F17 (join)
    with BuildSketch(Plane(origin=(0, 10, 0), x_dir=(-1, 0, 0), z_dir=(0, 1, 0))):
        Polygon((-20.7827799022, 4), (-5.7827799022, 4), (-20.7827799022, 19), align=None)
    with SkipClean():  # cleaning this boolean's faces spoils the solid; the shape is the same uncleaned
        extrude(amount=F17_DEPTH)

    # F2 (on face) → F18 (cut)
    with BuildSketch(Plane.XY.offset(4)):
        with BuildLine():
            Line((25, -20), (25, -15))
            ThreePointArc((25, -15), (23.5355338843, -18.5355339275), (19.9999999389, -20))
            Line((19.9999999389, -20), (25, -20))
        make_face()
        with BuildLine():
            ThreePointArc((20, 20), (23.5355339059, 18.5355339059), (25, 15))
            Line((25, 15), (25, 20))
            Line((25, 20), (20, 20))
        make_face()
    extrude(amount=-F18_DEPTH, mode=Mode.SUBTRACT)

    # F19 (on face) → F20 (join)
    with BuildSketch(Plane.XZ.offset(20)):
        Polygon((5, 4), (20, 4), (20, 19), align=None)
    extrude(amount=-F20_DEPTH)


solid = f1.part
